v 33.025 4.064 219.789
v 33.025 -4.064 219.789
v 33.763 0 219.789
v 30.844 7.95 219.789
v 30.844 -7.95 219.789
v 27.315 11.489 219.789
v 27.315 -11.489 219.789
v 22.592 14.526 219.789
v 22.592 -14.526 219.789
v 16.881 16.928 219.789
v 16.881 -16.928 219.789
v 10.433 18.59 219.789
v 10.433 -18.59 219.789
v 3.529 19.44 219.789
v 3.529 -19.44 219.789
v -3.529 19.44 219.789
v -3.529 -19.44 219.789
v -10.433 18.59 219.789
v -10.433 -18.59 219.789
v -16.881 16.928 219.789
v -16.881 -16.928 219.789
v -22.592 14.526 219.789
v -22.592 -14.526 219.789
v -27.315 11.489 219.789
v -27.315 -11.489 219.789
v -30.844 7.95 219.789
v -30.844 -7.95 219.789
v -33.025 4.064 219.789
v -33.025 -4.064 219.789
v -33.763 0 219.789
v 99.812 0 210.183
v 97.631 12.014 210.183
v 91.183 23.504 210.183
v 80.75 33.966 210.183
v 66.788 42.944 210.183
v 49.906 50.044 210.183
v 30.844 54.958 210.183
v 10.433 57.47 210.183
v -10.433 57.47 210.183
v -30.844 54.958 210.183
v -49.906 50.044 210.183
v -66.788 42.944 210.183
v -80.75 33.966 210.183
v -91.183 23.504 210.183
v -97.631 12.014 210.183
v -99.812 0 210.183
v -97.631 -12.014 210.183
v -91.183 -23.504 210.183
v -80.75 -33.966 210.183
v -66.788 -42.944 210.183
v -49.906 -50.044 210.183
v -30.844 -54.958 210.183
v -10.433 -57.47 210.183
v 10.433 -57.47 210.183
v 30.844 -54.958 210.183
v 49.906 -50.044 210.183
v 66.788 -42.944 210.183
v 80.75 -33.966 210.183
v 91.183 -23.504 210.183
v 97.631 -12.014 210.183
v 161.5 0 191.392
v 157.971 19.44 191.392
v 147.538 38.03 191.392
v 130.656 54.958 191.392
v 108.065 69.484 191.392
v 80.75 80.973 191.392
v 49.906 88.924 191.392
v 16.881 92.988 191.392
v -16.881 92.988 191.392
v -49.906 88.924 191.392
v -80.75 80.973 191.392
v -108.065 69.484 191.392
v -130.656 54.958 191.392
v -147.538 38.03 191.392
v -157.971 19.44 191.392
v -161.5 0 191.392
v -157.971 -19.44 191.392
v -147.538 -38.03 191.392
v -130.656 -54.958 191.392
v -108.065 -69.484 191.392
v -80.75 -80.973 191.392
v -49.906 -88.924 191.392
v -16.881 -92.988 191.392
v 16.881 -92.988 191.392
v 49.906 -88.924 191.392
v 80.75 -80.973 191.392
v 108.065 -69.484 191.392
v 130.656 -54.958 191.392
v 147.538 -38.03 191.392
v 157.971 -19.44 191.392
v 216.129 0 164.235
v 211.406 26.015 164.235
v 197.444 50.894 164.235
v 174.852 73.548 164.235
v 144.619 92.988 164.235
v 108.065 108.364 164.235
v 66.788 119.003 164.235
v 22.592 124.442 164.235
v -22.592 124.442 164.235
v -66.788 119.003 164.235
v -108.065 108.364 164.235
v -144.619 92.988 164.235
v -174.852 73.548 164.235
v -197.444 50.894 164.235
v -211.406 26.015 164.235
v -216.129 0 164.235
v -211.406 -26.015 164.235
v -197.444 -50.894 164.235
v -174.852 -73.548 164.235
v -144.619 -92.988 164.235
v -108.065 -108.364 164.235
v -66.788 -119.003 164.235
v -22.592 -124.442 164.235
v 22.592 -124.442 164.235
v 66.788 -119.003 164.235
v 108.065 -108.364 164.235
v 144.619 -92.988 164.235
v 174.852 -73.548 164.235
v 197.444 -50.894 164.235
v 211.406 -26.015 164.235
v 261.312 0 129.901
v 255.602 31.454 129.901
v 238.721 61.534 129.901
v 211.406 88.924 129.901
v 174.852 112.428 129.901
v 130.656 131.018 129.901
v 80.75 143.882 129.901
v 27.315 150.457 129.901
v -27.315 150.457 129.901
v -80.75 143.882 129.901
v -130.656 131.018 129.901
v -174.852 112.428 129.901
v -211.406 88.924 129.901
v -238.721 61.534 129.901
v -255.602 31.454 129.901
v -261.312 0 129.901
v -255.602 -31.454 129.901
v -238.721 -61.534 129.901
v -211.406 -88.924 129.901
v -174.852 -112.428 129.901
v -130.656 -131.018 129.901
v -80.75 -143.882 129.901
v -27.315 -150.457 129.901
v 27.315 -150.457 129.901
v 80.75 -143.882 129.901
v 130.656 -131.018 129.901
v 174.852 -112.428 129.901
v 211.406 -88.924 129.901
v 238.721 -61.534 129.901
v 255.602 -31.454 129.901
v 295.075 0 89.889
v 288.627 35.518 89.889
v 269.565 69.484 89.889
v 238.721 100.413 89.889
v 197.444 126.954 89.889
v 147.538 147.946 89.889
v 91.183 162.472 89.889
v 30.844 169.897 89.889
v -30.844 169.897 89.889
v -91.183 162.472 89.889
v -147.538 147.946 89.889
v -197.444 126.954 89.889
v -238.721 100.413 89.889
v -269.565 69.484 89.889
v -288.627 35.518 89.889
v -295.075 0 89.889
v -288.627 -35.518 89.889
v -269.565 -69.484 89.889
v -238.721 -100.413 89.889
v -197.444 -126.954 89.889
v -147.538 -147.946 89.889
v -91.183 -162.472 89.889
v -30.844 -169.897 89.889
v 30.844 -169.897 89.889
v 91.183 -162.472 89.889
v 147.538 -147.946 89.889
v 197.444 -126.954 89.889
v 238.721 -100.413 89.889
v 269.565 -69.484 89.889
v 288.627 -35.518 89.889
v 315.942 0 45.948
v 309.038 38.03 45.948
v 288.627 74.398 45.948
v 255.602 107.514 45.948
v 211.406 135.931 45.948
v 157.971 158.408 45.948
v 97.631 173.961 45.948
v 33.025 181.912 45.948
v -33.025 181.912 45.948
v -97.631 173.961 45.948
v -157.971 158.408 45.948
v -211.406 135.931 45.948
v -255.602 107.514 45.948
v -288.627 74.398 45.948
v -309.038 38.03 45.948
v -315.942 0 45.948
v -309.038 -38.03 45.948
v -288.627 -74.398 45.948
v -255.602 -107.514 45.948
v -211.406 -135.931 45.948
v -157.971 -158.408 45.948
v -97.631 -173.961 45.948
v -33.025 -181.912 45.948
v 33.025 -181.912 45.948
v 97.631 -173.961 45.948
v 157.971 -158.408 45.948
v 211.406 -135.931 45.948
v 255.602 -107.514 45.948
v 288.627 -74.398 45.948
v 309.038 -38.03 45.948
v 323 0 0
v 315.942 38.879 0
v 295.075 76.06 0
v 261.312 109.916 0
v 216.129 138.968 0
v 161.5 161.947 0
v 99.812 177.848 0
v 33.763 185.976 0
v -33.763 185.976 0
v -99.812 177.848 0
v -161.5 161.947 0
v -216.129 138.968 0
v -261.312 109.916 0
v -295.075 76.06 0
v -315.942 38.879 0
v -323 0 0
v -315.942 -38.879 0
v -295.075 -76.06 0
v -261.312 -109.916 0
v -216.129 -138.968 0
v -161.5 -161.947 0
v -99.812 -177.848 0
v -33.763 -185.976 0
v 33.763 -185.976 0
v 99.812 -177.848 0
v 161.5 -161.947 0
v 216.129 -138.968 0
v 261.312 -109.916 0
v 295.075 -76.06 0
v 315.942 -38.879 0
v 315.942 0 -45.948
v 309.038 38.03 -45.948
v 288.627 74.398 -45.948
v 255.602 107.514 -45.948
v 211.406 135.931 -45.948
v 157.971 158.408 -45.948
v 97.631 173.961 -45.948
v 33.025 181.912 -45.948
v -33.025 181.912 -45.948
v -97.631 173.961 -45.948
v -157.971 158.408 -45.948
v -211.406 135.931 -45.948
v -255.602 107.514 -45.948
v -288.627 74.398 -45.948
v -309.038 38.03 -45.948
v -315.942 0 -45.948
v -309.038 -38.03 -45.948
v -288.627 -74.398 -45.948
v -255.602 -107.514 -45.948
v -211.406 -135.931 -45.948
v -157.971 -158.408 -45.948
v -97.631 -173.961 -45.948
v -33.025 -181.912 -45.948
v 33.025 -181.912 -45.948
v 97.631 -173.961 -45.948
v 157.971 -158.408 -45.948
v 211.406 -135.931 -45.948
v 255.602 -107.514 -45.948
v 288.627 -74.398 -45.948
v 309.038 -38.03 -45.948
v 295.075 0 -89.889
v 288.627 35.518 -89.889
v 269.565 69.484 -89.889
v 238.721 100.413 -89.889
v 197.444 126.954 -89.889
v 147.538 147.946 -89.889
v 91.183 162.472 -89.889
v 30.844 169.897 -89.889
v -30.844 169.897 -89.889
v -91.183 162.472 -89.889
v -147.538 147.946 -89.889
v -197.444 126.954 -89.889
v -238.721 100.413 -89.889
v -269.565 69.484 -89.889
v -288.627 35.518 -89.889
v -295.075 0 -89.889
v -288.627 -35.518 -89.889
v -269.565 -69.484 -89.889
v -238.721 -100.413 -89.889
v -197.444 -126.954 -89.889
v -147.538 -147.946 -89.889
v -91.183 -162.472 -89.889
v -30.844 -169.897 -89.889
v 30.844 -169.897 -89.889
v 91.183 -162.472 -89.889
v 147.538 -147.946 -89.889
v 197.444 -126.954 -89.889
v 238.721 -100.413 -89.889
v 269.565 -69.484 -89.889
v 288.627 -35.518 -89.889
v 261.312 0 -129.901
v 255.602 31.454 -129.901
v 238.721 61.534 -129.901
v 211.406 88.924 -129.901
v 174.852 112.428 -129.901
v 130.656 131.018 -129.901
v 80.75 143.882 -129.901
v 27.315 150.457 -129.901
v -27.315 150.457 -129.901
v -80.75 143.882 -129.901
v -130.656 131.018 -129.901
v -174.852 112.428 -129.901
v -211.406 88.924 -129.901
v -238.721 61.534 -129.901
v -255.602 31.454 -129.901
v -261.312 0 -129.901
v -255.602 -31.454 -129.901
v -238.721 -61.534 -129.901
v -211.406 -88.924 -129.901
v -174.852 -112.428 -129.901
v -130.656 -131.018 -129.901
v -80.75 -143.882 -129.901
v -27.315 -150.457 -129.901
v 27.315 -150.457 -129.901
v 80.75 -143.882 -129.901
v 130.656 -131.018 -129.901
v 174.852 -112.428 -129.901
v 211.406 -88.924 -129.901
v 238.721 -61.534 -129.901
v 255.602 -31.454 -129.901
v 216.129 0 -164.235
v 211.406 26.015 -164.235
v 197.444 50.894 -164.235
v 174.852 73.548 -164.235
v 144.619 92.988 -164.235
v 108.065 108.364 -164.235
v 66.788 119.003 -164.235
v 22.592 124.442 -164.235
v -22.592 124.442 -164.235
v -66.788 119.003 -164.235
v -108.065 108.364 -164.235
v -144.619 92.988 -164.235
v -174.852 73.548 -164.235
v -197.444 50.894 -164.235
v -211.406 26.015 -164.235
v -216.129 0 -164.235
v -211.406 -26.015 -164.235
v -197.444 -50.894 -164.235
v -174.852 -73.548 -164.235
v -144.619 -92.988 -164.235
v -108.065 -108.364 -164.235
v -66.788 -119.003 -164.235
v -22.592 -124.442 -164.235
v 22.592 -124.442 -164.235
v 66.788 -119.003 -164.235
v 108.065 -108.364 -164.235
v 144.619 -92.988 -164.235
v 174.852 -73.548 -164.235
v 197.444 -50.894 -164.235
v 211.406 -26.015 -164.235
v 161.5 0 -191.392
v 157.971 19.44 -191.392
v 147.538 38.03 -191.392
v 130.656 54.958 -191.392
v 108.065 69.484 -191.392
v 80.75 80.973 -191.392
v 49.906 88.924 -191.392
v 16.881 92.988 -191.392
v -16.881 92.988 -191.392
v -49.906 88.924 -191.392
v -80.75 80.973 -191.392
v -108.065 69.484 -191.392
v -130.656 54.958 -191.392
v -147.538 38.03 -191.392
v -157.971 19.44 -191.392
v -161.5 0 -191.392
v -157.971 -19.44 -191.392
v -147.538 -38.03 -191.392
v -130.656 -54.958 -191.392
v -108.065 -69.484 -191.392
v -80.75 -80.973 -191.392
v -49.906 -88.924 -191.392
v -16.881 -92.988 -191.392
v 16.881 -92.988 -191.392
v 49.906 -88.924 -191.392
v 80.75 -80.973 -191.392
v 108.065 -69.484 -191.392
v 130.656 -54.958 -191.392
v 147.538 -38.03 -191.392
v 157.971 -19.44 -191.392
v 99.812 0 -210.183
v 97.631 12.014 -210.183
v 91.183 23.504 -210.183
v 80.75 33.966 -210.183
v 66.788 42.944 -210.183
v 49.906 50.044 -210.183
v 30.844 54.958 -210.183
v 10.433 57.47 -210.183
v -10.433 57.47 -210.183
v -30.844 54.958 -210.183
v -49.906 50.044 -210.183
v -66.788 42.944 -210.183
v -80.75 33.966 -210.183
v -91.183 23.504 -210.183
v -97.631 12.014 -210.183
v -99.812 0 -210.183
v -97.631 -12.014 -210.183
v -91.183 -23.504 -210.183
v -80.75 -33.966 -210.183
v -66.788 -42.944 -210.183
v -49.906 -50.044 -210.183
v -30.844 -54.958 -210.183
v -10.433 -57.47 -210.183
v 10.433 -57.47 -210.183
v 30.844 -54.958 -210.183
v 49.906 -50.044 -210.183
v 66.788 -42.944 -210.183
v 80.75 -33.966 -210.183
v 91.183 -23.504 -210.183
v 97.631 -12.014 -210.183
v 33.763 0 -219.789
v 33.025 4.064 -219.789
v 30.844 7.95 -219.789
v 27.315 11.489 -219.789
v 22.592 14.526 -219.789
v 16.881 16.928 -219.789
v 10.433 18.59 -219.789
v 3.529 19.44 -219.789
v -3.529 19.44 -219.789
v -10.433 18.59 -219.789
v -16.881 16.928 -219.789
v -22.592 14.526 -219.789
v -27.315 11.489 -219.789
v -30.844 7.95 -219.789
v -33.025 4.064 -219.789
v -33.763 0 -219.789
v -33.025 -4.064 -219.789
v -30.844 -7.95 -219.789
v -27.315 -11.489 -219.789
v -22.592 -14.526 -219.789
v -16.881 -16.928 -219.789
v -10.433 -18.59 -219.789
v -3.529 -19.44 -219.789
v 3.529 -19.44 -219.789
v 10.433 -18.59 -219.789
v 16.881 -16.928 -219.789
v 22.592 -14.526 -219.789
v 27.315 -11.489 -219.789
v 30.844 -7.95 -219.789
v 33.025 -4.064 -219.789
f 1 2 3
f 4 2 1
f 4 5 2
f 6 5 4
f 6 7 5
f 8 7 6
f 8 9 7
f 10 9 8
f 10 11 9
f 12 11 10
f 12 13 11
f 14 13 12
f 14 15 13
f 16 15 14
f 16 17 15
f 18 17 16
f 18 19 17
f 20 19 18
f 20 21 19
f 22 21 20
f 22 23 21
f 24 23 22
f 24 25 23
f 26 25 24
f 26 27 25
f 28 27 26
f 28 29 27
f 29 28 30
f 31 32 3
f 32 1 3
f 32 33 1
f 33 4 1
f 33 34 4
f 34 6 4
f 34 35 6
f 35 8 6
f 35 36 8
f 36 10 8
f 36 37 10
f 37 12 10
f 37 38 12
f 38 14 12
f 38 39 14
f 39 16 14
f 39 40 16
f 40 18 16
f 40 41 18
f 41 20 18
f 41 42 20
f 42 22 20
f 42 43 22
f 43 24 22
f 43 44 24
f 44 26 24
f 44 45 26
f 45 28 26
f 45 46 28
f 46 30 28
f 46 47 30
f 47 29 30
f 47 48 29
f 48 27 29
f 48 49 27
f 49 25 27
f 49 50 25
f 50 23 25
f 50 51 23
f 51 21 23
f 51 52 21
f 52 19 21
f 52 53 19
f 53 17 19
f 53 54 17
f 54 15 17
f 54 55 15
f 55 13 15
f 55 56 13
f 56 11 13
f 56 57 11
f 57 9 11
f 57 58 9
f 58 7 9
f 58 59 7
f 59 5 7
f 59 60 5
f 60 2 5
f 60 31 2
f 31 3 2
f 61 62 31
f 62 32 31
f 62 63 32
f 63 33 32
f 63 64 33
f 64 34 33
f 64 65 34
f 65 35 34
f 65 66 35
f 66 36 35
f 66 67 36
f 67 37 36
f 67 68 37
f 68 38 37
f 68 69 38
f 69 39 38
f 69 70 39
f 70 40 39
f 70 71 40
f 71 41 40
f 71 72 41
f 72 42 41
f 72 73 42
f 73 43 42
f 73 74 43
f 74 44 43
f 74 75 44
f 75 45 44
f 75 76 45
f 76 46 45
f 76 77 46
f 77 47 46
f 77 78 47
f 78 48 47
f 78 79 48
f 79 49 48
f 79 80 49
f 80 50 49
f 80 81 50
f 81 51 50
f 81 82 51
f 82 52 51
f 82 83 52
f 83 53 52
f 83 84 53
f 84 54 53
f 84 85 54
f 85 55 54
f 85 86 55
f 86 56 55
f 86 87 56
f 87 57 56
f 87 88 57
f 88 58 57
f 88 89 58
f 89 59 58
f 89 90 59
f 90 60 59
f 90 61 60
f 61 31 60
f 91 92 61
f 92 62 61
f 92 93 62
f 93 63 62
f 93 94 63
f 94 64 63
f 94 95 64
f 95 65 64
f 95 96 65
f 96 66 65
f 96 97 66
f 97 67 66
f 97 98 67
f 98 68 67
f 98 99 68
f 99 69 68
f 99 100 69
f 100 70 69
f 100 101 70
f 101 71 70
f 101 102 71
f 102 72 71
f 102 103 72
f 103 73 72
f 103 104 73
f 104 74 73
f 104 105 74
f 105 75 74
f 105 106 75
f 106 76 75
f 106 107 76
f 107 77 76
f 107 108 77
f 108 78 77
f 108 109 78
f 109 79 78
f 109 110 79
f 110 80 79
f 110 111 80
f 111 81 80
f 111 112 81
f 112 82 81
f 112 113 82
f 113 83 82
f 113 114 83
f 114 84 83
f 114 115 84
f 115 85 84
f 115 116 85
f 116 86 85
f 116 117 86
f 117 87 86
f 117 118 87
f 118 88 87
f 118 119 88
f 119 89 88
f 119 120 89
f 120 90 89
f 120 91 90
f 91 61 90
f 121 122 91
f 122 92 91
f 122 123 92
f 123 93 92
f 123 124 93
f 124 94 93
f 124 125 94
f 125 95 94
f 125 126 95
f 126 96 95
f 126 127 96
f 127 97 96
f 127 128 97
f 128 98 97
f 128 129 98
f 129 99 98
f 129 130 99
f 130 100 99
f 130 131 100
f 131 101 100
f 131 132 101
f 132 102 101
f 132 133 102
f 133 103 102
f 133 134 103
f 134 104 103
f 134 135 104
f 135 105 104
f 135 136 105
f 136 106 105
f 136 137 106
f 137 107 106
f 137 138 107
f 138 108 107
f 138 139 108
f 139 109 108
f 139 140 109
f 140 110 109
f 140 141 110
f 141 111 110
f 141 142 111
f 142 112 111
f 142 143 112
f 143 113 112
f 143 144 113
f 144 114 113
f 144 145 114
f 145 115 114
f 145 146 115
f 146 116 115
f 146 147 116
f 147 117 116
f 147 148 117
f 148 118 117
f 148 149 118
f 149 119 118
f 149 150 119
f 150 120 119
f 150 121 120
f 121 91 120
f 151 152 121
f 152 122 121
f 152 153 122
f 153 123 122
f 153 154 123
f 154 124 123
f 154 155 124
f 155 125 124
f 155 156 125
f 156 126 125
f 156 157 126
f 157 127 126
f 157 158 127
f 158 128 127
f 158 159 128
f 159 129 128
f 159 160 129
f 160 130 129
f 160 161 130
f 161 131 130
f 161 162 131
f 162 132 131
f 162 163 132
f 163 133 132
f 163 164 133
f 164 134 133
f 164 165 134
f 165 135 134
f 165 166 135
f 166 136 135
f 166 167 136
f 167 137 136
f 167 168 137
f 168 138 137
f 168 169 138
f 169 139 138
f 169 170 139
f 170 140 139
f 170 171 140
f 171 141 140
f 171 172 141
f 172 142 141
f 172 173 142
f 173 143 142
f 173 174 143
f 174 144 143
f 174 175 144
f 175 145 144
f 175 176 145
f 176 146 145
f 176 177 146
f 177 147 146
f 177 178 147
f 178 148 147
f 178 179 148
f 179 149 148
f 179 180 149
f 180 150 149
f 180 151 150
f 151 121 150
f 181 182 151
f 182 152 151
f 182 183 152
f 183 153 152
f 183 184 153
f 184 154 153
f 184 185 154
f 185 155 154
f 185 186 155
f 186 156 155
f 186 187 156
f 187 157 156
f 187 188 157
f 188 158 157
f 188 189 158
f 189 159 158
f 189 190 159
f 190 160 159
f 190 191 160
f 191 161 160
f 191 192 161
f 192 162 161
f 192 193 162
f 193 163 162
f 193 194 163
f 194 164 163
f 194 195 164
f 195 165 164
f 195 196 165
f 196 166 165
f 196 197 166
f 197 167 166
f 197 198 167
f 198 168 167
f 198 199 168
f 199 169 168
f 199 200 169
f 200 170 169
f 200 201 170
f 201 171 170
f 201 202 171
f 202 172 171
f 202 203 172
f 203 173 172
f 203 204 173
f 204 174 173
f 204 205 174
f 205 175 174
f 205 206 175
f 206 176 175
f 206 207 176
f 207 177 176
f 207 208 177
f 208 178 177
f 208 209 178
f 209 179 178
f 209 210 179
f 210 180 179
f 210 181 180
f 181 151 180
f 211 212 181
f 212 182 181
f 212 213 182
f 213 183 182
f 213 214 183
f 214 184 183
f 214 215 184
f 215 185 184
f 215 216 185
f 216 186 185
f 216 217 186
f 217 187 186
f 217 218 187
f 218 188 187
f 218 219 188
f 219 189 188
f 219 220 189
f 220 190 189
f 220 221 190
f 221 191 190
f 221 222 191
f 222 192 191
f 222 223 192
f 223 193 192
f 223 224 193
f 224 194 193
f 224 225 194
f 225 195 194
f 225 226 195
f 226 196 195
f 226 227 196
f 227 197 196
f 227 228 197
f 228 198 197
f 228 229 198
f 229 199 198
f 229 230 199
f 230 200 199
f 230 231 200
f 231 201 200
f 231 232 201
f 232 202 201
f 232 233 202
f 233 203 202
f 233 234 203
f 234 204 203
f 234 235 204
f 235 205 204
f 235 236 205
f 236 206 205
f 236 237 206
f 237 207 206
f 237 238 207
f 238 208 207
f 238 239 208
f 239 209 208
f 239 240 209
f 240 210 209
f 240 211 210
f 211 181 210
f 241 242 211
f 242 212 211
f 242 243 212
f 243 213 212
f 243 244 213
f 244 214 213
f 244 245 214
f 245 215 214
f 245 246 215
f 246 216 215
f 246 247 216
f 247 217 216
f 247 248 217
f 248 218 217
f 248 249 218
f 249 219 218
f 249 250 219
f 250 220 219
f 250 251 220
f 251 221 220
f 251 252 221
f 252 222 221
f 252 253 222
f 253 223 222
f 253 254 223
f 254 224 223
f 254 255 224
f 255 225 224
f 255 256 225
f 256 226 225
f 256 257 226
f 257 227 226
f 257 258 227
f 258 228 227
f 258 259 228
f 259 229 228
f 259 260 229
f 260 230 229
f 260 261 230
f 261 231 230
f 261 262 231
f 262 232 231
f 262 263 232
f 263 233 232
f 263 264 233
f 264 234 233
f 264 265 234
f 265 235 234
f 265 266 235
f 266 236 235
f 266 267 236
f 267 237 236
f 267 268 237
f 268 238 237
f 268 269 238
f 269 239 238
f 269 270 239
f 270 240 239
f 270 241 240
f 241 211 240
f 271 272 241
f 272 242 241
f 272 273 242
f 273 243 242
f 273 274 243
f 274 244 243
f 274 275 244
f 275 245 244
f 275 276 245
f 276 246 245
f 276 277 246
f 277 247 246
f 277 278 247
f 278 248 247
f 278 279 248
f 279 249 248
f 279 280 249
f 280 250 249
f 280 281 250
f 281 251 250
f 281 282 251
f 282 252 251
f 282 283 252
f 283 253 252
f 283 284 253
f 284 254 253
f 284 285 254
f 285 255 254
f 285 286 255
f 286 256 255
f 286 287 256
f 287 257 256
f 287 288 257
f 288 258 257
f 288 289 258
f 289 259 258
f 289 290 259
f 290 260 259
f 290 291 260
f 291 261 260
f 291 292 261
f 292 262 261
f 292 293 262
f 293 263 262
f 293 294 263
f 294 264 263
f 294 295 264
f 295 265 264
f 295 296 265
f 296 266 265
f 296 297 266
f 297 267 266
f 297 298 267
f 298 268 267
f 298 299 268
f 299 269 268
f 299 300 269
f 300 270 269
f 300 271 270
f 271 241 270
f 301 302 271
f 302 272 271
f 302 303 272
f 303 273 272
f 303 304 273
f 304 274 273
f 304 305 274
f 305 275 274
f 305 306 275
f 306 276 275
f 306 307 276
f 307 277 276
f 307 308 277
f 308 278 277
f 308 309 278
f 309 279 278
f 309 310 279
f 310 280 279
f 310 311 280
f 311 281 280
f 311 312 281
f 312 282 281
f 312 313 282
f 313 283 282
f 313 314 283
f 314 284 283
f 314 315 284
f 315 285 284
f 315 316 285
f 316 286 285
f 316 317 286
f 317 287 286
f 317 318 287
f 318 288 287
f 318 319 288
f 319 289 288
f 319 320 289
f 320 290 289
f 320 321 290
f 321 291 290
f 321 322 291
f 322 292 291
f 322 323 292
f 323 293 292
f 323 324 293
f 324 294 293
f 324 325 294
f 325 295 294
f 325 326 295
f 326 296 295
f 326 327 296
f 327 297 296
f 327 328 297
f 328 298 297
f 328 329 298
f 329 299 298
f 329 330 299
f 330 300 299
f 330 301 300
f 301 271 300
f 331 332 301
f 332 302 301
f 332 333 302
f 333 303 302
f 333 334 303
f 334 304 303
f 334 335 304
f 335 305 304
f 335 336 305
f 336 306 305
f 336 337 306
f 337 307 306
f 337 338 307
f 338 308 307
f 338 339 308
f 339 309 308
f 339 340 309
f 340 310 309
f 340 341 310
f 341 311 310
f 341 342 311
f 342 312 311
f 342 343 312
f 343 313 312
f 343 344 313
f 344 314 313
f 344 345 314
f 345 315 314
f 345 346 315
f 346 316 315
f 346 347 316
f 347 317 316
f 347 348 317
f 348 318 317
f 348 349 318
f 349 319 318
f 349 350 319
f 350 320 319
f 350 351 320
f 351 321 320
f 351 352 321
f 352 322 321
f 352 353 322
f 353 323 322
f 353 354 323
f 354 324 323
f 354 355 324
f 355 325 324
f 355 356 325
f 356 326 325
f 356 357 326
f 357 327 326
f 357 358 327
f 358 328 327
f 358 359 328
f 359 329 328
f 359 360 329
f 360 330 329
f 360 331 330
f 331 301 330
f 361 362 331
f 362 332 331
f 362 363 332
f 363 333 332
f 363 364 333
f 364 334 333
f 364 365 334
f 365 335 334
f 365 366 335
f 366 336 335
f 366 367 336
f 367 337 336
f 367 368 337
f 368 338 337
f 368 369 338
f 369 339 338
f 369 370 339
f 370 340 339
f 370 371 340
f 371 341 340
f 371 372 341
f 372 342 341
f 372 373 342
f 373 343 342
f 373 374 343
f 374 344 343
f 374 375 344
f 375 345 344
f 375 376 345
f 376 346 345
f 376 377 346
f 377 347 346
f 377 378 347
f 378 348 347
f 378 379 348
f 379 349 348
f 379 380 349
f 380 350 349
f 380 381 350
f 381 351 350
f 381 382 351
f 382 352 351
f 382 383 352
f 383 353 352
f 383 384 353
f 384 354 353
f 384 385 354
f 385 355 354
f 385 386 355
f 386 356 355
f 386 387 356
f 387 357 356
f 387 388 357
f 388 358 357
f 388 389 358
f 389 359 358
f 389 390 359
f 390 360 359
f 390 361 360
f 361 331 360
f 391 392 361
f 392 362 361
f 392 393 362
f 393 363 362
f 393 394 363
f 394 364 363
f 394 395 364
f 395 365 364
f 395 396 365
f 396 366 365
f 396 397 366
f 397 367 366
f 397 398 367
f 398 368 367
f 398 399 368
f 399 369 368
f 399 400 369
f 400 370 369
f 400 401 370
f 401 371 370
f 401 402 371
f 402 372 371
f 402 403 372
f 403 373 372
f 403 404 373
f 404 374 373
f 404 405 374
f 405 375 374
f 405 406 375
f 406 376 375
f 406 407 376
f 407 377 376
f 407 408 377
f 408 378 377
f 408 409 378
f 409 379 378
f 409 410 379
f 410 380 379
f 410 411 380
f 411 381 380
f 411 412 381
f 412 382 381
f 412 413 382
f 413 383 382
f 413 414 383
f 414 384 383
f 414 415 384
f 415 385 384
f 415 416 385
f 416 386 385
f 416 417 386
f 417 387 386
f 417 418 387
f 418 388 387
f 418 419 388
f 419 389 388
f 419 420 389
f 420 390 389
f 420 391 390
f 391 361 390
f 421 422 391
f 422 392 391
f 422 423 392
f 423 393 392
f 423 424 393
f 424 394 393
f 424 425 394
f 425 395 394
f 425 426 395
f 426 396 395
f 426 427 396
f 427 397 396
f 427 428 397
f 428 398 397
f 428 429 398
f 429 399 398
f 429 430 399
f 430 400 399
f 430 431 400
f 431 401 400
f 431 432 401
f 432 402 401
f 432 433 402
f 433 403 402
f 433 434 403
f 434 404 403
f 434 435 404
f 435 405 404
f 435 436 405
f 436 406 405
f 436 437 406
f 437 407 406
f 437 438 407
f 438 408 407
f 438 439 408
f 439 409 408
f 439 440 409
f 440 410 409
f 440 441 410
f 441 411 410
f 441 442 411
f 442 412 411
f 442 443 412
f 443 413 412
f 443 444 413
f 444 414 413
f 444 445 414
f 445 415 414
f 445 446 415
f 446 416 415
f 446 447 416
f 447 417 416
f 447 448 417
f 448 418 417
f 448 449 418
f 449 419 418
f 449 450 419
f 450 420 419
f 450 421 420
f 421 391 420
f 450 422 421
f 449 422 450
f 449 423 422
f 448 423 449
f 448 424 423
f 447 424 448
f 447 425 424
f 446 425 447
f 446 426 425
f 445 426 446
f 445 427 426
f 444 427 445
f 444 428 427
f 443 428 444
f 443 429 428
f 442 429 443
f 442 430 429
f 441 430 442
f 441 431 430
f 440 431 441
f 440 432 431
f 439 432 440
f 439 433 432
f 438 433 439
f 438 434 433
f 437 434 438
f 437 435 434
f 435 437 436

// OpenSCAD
// Generated by SolidPython 1.0.1 on 2020-07-29 00:46:54


scale(v = [19, 11, 13]) {
	sphere(r = 17);
}
/***********************************************
*********      SolidPython code:      **********
************************************************
 
# import packages: SolidPython
from solid import *
from solid.utils import *
from itertools import chain, combinations, permutations


class Resize:

    def __init__(self, scad_file):
        self.scad_file = scad_file
        #self.scad_file = import_scad(scad_file)
        # cone/cylinder param:
        self.r1 = 0
        self.r2 = 0
        self.h = 0
        # rectangular prism param:
        self.w = 0
        self.l = 0
        # ellipse param:
        self.r = 0

    # import OpenScad code (file name corresponds to shape)


    # classify shape + parameters
    def assign(self, param1, param2, param3):
        if self.scad_file == 'cone.scad':
            self.r1 = param1
            self.r2 = param2
            self.h = param3
        elif self.scad_file == 'cylinder.scad':
            self.r1 = param1
            self.r2 = param2
            self.h = param3
        elif self.scad_file == 'rectangularPrism.scad':
            self.h = param1
            self.l = param2
            self.w = param3
        else:
            self.r = param1
            self.h = param2

    # resize parameters
    def iterate(self):
        x = range(3, 20, 2)
        i = 1
        if self.scad_file == 'cone.scad':
            tempList = list(permutations(x, 2))
            for temp in tempList:
                param1 = temp[0]
                param2 = temp[1]
                filepath = 'produced_scad_files/' + 'cone' + str(param1) + '_' + str(param2) + '_' + '.scad'
                scad_render_to_file(cylinder(h=param1, r1=param2, r2=0), filepath)

        elif self.scad_file == 'cylinder.scad':
            tempList = list(permutations(x, 3))
            for temp in tempList:
                param1 = temp[0]
                param2 = temp[1]
                filepath = 'produced_scad_files/' + 'cylinder' + str(param1) + '_' + str(param2) + '_' + '.scad'
                scad_render_to_file(cylinder(h=param1, r1=param2, r2=param2), filepath)

        elif self.scad_file == 'rectangularPrism.scad':
            tempList = list(permutations(x, 3))
            for temp in tempList:
                param1 = temp[0]
                param2 = temp[1]
                param3 = temp[2]
                filepath = 'produced_scad_files/' + 'rectangularPrism' + str(param1) + '_' + str(param2) + '_' + str(
                    param3) + '.scad'
                scad_render_to_file(cube(size=(param1, param2, param3)), filepath)

        elif self.scad_file == 'ellipse.scad':
            tempList = list(permutations(x, 4))
            for temp in tempList:
                param1 = temp[0]
                param2 = temp[1]
                param3 = temp[2]
                param4 = temp[3]
                filepath = 'produced_scad_files/' + 'ellipse' + str(param1) + '_' + str(param2) + '_' + str(param3) + '_' + str(param4) + '.scad'
                scad_render_to_file(scale([param1, param2, param3])(sphere(r=param4)), filepath)

    def render_to_scadfile(self):
        scad_render_to_file(scad, 'example.scad') 
 
************************************************/
